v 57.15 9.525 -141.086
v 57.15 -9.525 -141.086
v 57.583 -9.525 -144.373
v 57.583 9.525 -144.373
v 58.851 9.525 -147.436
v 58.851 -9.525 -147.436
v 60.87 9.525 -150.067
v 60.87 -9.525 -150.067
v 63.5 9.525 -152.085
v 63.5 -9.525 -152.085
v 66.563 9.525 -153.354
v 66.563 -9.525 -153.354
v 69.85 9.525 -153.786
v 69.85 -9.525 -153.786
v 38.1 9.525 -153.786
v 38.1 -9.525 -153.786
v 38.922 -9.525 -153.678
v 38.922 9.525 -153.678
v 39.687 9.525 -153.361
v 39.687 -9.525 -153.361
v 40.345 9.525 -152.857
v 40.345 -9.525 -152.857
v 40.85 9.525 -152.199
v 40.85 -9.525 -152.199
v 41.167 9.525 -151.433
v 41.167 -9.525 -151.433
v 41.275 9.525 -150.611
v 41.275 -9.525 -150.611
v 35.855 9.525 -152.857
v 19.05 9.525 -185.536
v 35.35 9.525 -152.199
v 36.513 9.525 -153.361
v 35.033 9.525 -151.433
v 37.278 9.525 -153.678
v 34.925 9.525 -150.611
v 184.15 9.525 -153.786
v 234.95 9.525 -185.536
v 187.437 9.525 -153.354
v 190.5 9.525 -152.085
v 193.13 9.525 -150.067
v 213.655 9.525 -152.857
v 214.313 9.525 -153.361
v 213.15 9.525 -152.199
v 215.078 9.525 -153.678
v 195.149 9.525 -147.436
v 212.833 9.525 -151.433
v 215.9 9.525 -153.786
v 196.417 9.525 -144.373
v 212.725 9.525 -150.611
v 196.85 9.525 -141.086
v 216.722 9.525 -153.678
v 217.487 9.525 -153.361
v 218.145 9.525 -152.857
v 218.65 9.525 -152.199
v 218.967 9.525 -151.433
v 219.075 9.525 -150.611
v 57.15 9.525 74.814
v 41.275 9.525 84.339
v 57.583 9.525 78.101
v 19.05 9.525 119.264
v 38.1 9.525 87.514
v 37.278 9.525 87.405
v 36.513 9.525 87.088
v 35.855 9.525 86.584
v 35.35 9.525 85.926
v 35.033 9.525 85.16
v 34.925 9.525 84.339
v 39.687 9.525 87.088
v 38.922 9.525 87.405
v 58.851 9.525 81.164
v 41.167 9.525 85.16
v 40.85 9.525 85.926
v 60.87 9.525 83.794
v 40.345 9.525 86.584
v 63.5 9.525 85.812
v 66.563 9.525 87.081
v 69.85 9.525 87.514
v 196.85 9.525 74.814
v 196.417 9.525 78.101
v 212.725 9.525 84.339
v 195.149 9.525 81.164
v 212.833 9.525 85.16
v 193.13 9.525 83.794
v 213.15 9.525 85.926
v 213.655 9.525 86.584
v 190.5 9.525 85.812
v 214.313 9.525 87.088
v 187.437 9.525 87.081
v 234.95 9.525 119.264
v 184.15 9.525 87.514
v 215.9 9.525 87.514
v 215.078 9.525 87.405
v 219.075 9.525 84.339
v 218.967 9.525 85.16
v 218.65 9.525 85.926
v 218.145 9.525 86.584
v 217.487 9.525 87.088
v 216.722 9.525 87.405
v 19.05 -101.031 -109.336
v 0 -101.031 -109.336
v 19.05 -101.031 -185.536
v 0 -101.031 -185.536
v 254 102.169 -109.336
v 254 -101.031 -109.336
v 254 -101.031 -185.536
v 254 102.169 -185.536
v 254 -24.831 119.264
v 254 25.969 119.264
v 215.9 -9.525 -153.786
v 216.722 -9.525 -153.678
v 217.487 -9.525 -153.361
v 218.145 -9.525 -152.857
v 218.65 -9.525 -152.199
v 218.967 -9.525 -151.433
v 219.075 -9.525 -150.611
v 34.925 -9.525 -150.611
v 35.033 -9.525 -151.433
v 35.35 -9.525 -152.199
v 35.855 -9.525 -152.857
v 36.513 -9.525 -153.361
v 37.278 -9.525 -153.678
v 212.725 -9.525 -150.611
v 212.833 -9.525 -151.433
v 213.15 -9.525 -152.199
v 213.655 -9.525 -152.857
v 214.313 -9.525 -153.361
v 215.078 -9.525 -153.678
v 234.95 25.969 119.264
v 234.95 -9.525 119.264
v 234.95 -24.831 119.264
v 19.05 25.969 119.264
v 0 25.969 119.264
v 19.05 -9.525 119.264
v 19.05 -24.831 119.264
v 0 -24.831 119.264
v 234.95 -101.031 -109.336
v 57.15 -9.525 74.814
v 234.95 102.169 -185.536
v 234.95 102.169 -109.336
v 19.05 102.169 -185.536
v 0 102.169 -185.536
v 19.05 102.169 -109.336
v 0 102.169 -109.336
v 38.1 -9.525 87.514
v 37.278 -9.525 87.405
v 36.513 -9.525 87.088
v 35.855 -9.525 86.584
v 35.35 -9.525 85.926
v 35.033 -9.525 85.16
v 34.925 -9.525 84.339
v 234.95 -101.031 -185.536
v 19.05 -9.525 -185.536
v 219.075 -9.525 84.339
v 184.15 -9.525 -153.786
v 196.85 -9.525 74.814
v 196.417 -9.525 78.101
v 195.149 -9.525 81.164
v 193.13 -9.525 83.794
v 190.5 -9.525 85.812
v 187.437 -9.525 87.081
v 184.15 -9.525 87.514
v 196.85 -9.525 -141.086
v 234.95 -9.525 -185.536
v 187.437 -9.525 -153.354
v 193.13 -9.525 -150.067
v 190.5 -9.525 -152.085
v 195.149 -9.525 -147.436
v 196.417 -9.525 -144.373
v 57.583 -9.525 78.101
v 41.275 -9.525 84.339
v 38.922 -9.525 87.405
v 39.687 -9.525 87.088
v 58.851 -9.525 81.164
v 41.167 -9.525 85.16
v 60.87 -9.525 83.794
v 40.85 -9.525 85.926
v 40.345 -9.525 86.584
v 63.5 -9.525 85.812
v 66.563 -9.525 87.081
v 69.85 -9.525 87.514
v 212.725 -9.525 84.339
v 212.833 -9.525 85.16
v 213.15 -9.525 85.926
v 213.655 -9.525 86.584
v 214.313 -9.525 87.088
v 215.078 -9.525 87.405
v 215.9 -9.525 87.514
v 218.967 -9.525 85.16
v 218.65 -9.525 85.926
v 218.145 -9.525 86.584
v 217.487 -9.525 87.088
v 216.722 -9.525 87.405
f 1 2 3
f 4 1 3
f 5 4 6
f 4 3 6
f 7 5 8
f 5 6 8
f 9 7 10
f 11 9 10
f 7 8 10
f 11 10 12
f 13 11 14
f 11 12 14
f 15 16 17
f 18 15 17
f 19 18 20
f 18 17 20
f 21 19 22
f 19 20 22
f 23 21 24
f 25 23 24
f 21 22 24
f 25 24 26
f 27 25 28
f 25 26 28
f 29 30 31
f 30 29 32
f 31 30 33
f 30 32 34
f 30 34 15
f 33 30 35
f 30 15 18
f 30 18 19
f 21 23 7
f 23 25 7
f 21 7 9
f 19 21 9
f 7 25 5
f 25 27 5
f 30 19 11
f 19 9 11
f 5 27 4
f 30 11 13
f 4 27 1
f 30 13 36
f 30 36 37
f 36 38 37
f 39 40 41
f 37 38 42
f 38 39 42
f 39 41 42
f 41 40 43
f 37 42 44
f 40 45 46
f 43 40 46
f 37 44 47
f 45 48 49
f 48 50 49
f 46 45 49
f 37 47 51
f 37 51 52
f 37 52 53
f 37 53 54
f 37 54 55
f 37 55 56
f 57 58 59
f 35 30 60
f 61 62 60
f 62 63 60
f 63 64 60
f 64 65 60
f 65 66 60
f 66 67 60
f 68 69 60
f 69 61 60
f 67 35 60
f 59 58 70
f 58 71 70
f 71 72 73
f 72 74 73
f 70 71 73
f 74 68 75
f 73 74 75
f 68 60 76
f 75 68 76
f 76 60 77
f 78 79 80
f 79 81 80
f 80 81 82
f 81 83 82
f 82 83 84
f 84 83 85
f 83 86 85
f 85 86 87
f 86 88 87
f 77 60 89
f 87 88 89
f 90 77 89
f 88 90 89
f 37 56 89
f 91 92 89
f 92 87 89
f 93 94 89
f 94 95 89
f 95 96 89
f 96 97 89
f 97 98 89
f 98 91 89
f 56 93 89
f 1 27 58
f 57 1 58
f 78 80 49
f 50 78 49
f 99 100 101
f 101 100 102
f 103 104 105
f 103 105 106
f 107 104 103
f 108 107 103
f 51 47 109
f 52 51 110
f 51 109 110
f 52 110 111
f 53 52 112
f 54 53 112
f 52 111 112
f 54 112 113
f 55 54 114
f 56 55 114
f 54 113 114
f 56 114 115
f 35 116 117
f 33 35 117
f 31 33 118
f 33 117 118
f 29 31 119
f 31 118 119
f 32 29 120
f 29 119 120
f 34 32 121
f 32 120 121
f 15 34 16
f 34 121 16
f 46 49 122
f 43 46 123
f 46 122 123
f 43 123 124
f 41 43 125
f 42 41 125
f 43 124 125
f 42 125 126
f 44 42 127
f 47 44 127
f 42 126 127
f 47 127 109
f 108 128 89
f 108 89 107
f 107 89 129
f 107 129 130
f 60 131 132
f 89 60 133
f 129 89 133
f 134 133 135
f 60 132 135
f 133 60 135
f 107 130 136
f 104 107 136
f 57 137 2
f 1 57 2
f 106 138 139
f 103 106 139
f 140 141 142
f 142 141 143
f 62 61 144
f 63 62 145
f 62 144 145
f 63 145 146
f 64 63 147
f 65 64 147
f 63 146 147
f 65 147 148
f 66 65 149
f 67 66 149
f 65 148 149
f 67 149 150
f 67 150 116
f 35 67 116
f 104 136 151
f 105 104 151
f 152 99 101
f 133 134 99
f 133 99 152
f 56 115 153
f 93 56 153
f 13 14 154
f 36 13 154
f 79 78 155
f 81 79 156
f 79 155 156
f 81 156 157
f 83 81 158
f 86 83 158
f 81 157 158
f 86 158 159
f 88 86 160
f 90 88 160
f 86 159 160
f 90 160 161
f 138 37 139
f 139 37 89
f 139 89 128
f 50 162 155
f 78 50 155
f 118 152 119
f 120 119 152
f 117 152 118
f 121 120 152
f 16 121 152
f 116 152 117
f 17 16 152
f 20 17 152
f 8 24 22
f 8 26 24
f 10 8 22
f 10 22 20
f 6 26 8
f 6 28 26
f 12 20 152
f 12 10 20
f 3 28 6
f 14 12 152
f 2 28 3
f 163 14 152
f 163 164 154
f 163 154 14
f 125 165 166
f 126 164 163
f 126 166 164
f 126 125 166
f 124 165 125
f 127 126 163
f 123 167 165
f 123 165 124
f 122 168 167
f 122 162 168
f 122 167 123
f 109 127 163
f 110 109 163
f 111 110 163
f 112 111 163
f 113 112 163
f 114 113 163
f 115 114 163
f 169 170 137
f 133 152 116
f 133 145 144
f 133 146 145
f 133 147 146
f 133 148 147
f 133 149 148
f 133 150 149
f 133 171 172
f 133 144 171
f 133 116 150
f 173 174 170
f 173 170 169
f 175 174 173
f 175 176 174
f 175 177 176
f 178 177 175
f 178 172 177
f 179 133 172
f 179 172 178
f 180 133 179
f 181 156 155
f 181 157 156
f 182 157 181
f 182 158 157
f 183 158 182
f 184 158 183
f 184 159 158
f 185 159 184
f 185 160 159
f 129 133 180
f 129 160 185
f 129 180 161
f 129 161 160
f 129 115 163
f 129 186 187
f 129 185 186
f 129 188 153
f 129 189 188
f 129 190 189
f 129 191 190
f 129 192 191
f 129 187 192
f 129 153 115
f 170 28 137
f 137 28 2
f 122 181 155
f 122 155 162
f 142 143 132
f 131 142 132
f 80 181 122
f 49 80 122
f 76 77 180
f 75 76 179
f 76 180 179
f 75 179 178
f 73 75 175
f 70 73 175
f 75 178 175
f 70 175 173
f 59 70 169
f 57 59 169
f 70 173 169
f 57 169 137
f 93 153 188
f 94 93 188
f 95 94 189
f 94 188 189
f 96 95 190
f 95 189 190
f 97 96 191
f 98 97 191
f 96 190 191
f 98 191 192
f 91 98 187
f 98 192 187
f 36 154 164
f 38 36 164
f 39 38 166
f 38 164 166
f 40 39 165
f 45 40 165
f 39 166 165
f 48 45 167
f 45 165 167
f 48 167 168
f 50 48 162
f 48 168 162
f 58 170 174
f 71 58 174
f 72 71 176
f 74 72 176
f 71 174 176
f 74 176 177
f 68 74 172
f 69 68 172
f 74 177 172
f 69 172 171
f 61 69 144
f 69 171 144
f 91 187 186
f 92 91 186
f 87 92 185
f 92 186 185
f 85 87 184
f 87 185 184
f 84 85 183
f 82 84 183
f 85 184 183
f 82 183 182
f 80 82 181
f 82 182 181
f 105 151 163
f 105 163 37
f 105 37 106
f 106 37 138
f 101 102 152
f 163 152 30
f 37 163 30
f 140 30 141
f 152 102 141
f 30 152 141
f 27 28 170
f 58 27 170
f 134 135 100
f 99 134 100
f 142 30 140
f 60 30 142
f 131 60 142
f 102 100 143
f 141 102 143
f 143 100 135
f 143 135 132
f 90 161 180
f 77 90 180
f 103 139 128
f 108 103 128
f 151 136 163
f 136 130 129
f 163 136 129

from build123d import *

# Parameters (mm, degrees)
F1_DEPTH = 254
F2_W     = 215.9
F2_H     = 92.64379
F2_H_2   = 91.50621
F3_DEPTH = 304.801
F5_DEPTH = 111.69479
F7_DEPTH = 111.69479


with BuildPart() as f1:
    # F0 (on Right) → F1 (new body)
    with BuildSketch(Plane.YZ):
        Polygon((25.96879, 119.263514), (-24.83121, 119.263514), (-101.03121, -109.336486), (-101.03121, -185.536486), (102.16879, -185.536486), (102.16879, -109.336486), align=None)
    extrude(amount=F1_DEPTH)

    # F2 (on face) → F3 (cut, through all)
    with BuildSketch(Plane.XY.offset(119.263514)):
        with Locations((127, 55.846895)):
            Rectangle(F2_W, F2_H)
        with Locations((127, -55.278105)):
            Rectangle(F2_W, F2_H_2)
    extrude(amount=-F3_DEPTH, mode=Mode.SUBTRACT)

    # F4 (on face) → F5 (cut, through all)
    with BuildSketch(Plane.XZ.offset(9.525)):
        with BuildLine():
            Line((184.15, 87.513514), (69.85, 87.513514))
            ThreePointArc((69.85, 87.513514), (60.869744, 83.79377), (57.15, 74.813514))
            Line((57.15, 74.813514), (57.15, -141.086486))
            ThreePointArc((57.15, -141.086486), (60.869744, -150.066742), (69.85, -153.786486))
            Line((69.85, -153.786486), (184.15, -153.786486))
            ThreePointArc((184.15, -153.786486), (193.130256, -150.066742), (196.85, -141.086486))
            Line((196.85, -141.086486), (196.85, 74.813514))
            ThreePointArc((196.85, 74.813514), (193.130256, 83.79377), (184.15, 87.513514))
        make_face()
    extrude(amount=-F5_DEPTH, mode=Mode.SUBTRACT)

    # F6 (on face) → F7 (cut, through all)
    with BuildSketch(Plane.XZ.offset(9.525)):
        with BuildLine():
            ThreePointArc((38.1, 87.513514), (35.854936, 86.583578), (34.925, 84.338514))
            Line((34.925, 84.338514), (34.925, -150.611486))
            ThreePointArc((34.925, -150.611486), (35.854936, -152.85655), (38.1, -153.786486))
            ThreePointArc((38.1, -153.786486), (40.345064, -152.85655), (41.275, -150.611486))
            Line((41.275, -150.611486), (41.275, 84.338514))
            ThreePointArc((41.275, 84.338514), (40.345064, 86.583578), (38.1, 87.513514))
        make_face()
        with BuildLine():
            ThreePointArc((215.9, -153.786486), (218.145064, -152.85655), (219.075, -150.611486))
            Line((219.075, -150.611486), (219.075, 84.338514))
            ThreePointArc((219.075, 84.338514), (218.145064, 86.583578), (215.9, 87.513514))
            ThreePointArc((215.9, 87.513514), (213.654936, 86.583578), (212.725, 84.338514))
            Line((212.725, 84.338514), (212.725, -150.611486))
            ThreePointArc((212.725, -150.611486), (213.654936, -152.85655), (215.9, -153.786486))
        make_face()
    extrude(amount=-F7_DEPTH, mode=Mode.SUBTRACT)


solid = f1.part
